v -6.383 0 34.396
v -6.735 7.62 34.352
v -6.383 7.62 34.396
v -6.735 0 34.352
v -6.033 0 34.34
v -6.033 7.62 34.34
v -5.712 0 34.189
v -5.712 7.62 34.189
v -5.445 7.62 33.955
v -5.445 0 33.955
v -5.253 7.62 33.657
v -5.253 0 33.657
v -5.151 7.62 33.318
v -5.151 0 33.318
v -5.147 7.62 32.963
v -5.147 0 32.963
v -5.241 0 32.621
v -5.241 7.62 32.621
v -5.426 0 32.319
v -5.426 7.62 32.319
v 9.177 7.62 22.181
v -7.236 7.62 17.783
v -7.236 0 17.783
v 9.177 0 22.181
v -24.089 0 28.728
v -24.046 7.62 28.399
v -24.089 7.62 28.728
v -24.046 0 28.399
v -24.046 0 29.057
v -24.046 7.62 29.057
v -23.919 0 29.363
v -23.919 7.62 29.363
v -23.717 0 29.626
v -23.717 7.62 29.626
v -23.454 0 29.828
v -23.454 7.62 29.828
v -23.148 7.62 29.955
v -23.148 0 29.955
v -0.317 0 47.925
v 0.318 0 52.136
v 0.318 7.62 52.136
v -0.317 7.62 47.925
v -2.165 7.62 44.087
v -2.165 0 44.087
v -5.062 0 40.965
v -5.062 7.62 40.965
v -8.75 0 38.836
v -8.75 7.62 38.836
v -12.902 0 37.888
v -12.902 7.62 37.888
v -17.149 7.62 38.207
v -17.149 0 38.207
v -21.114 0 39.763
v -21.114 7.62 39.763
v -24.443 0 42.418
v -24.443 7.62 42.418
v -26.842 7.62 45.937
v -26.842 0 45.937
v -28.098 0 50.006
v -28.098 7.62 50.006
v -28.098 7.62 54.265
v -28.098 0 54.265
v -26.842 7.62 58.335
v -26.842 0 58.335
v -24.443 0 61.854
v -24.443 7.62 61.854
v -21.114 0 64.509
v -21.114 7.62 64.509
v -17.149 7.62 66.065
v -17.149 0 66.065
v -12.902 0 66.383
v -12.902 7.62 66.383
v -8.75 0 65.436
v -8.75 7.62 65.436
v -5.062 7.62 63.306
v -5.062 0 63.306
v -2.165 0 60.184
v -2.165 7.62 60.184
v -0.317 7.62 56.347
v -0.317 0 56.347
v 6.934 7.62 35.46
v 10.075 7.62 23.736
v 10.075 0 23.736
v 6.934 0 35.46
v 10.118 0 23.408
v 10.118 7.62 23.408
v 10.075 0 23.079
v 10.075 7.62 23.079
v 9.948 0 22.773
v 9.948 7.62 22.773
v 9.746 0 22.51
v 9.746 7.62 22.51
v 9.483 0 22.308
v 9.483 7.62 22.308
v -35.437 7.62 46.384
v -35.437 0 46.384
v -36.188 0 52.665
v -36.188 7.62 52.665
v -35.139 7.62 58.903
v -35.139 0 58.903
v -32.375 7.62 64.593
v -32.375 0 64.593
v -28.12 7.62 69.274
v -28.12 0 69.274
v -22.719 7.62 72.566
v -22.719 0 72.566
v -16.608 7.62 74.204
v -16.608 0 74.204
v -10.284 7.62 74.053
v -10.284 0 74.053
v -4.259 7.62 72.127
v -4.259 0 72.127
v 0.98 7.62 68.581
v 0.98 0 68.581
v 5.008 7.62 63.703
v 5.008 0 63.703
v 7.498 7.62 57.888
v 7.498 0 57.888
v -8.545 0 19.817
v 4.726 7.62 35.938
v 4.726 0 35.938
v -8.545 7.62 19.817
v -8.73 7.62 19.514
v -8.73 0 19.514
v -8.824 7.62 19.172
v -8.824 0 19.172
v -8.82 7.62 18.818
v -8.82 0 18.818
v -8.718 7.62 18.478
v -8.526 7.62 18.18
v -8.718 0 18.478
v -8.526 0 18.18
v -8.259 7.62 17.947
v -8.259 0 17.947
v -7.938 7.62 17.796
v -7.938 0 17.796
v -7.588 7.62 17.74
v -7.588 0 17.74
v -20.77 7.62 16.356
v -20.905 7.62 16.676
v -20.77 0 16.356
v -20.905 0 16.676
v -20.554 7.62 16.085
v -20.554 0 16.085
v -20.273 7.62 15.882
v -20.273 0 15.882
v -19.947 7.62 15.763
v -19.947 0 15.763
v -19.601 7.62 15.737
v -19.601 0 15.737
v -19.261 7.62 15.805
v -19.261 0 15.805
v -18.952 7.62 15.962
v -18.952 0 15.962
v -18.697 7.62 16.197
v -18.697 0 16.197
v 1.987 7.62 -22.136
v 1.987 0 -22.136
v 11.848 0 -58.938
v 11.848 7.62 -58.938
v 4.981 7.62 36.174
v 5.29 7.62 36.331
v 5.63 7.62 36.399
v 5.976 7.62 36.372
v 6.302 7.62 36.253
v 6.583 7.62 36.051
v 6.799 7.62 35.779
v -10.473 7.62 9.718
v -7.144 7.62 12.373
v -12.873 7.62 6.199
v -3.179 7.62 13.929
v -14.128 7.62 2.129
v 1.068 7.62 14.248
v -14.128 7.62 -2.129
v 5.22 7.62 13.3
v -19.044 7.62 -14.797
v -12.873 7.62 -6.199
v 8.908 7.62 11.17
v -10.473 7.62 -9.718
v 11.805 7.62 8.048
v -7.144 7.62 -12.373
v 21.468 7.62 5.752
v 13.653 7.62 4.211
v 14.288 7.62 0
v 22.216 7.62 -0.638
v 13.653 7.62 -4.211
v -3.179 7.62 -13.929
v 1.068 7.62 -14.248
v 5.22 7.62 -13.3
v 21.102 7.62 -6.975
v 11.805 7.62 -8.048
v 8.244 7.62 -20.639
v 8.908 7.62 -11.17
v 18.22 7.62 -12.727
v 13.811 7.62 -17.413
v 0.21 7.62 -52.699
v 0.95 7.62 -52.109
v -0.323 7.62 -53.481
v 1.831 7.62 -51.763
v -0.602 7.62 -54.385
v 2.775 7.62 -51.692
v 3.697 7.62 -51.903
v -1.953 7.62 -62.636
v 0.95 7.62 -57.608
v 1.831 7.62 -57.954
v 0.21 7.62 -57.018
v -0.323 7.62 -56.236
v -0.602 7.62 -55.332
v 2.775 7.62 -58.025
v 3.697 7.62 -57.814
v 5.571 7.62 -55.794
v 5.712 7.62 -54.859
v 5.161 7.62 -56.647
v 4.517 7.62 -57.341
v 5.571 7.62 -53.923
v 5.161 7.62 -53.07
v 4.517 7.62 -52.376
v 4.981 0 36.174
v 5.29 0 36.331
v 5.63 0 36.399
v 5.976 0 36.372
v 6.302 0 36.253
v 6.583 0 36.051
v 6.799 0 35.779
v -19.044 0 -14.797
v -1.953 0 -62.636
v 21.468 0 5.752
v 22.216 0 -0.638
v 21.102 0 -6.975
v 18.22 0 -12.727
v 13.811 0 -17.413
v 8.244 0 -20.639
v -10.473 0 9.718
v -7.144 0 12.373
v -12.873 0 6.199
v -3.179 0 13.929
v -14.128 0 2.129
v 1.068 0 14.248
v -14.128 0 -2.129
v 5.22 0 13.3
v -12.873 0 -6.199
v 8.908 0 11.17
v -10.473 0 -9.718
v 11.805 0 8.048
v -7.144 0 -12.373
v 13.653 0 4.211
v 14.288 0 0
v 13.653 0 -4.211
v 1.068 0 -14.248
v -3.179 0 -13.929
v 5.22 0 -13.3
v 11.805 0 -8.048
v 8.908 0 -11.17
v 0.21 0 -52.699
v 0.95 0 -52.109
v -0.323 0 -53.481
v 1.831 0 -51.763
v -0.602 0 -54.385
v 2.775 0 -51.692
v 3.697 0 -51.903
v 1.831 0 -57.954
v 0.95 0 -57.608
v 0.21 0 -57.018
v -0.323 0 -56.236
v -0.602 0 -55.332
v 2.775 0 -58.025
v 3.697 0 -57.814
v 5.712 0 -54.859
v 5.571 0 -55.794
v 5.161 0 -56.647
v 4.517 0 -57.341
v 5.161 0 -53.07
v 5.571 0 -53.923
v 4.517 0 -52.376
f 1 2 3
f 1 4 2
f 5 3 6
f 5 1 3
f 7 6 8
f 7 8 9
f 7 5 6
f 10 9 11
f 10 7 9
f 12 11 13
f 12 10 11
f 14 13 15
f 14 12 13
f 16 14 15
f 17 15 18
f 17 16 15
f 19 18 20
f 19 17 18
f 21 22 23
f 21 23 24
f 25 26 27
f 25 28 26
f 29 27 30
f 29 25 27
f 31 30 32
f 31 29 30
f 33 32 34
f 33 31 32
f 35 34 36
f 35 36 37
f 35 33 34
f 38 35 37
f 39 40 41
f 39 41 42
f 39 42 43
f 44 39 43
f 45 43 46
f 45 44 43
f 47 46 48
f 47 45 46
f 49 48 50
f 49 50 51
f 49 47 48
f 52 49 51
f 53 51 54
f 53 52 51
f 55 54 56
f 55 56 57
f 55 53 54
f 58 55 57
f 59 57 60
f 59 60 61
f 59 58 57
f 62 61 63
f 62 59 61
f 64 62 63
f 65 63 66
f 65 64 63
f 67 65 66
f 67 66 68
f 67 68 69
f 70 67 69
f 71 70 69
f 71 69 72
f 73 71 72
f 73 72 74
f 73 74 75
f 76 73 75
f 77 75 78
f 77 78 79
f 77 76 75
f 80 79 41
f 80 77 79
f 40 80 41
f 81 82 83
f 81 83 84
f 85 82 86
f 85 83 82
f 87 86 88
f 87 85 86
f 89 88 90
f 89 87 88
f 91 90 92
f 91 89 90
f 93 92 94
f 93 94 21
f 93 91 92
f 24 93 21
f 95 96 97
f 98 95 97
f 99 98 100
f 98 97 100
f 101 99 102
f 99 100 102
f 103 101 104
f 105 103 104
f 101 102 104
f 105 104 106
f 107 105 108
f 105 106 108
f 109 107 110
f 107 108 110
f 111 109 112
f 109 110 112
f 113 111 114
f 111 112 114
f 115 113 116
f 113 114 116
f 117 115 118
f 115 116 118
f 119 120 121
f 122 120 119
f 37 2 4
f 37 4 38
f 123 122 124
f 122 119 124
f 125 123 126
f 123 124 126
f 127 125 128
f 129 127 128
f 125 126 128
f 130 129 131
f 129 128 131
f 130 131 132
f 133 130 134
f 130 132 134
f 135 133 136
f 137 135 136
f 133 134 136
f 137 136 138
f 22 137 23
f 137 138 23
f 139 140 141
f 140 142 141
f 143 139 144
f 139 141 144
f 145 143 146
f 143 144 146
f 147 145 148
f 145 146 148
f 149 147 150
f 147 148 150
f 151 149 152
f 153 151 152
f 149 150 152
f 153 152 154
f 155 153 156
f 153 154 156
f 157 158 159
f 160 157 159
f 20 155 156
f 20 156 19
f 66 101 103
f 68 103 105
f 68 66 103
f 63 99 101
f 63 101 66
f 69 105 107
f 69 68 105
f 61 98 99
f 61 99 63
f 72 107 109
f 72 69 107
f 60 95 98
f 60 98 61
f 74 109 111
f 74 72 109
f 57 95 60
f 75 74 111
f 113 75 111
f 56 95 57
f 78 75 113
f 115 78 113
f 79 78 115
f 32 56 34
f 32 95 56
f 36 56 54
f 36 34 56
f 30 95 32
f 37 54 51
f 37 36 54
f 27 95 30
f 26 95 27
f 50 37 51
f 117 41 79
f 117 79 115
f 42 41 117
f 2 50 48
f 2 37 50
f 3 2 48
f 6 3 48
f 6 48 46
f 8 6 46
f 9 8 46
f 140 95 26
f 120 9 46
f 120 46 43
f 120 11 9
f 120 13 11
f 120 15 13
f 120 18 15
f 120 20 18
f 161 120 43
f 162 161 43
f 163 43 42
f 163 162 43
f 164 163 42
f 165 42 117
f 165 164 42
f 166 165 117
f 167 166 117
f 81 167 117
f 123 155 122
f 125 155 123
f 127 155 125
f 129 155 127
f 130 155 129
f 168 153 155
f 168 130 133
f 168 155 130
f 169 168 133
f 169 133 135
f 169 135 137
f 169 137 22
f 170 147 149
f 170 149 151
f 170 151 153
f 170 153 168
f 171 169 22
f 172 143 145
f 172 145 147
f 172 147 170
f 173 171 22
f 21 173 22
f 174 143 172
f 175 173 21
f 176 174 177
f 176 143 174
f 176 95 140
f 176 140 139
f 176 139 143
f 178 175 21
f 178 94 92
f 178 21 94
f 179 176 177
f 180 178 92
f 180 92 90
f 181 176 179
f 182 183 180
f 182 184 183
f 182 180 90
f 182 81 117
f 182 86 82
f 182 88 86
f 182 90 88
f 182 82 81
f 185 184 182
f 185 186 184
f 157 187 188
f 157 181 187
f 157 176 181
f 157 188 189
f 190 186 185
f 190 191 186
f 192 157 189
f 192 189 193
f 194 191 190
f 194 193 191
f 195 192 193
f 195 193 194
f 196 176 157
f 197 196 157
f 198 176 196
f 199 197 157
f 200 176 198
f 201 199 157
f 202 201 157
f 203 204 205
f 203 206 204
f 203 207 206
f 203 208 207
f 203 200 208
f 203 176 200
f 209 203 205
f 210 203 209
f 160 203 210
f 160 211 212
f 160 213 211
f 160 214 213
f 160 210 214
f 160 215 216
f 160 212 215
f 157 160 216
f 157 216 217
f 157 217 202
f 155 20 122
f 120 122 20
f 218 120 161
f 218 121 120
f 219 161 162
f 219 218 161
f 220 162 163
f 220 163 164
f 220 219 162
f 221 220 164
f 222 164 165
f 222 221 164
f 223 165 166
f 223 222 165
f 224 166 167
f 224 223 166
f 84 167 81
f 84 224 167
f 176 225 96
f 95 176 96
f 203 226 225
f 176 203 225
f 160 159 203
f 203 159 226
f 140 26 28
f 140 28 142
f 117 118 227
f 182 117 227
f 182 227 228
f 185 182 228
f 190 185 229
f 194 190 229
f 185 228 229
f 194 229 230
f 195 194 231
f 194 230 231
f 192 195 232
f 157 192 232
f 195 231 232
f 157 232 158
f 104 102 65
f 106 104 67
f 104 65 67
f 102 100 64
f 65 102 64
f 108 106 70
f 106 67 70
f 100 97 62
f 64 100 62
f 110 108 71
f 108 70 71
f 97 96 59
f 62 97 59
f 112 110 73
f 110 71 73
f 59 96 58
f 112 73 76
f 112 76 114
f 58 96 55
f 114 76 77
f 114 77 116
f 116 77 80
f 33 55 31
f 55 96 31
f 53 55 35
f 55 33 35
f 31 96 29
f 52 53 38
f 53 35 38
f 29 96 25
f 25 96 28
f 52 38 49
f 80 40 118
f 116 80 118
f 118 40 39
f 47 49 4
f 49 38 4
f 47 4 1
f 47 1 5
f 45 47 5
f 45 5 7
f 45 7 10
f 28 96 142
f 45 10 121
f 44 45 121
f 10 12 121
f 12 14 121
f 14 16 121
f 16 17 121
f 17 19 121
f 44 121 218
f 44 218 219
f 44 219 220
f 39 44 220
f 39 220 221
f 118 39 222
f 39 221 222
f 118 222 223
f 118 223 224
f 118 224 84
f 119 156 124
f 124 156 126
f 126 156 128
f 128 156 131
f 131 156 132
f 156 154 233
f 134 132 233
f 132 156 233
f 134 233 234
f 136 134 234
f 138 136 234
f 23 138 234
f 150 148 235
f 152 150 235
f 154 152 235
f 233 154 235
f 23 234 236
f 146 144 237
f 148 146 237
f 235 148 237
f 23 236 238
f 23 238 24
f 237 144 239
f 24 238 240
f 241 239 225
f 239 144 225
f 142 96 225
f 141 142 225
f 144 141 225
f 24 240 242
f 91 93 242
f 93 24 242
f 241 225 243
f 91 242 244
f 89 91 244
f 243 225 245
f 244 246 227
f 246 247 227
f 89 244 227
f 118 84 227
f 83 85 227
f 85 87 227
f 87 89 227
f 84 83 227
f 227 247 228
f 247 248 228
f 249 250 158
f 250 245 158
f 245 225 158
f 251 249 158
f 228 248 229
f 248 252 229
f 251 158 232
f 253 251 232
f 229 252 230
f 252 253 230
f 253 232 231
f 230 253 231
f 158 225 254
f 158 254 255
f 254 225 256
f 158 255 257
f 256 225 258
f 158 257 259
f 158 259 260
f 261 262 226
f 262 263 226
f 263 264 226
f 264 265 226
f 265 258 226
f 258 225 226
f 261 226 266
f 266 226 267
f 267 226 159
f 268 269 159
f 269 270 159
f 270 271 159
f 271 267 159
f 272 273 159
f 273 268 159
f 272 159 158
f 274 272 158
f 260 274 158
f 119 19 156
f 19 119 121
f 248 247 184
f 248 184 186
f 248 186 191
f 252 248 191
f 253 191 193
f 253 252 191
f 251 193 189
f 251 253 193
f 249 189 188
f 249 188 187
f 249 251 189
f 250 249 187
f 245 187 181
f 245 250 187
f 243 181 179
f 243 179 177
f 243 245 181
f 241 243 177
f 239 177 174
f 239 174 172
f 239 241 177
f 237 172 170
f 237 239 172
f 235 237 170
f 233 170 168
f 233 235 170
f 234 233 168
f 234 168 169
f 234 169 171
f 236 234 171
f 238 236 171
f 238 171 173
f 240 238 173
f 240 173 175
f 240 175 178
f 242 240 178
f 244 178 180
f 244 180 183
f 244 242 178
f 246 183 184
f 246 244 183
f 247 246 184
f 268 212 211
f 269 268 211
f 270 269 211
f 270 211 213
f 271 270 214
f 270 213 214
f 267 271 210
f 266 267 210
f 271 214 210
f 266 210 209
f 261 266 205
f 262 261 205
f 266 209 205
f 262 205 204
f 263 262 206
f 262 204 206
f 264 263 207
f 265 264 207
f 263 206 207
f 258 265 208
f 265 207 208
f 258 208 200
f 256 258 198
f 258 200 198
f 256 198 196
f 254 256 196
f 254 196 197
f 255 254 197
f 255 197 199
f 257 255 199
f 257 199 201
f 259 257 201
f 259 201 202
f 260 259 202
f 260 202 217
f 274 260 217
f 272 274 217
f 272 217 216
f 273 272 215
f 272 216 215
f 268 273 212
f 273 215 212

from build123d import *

# Parameters (mm, degrees)
SKETCH1_R           = 14.2875
BOSS_EXTRUDE1_DEPTH = 7.62
CUT_EXTRUDE1_DEPTH  = 8.62
FILLET1_R           = 1.27
SKETCH3_R           = 3.175
CUT_EXTRUDE2_DEPTH  = 7.62


with BuildPart() as part:
    # Sketch1 → Boss-Extrude1 (new body)
    with BuildSketch(Plane(origin=(0, 0, 0), x_dir=(1, 0, 0), z_dir=(0, 1, 0))):
        with BuildLine():
            Line((7.49794353, -57.888099751), (21.467701489, -5.752253277))
            ThreePointArc((21.467701489, -5.752253277), (18.22000551, 12.727215887), (1.986922694, 22.136006036))
            Line((1.986922694, 22.136006036), (11.847928312, 58.937780017))
            Line((11.847928312, 58.937780017), (-1.952736931, 62.635657124))
            Line((-1.952736931, 62.635657124), (-19.044132712, 14.797135091))
            Line((-19.044132712, 14.797135091), (-35.437459449, -46.383593197))
            ThreePointArc((-35.437459449, -46.383593197), (-19.722011237, -73.603547963), (7.49794353, -57.888099751))
        make_face()
        with Locations((-13.969757959, -52.135846474)):
            Circle(SKETCH1_R, mode=Mode.SUBTRACT)
        Circle(SKETCH1_R, mode=Mode.SUBTRACT)
    extrude(amount=BOSS_EXTRUDE1_DEPTH)

    # Sketch2 → Cut-Extrude1 (cut, through all)
    with BuildSketch(Plane(origin=(0, 7.62, 0), x_dir=(1, 0, 0), z_dir=(0, 1, 0))):
        Polygon((-20.265778136, -14.291812351), (-2.906828988, -35.378138121), (-24.374530477, -29.625884844), align=None)
        Polygon((-11.064131806, -16.757386054), (10.403569683, -22.509639332), (6.294817342, -37.843711824), align=None)
    extrude(amount=-CUT_EXTRUDE1_DEPTH, mode=Mode.SUBTRACT)

    # Fillet1
    fillet1_edges = [part.edges().sort_by_distance(p)[0] for p in [
        (-24.374530477, 3.81, 29.625884844),
        (-20.265778136, 3.81, 14.291812351),
        (-2.906828988, 3.81, 35.378138121),
        (6.294817342, 3.81, 37.843711824),
        (-11.064131806, 3.81, 16.757386054),
        (10.403569683, 3.81, 22.509639332),
    ]]
    fillet(fillet1_edges, radius=FILLET1_R)

    # Sketch3 → Cut-Extrude2 (cut)
    with BuildSketch(Plane(origin=(0, 7.62, 0), x_dir=(1, 0, 0), z_dir=(0, 1, 0))):
        with Locations((2.537391129, 54.858527191)):
            Circle(SKETCH3_R)
    extrude(amount=-CUT_EXTRUDE2_DEPTH, mode=Mode.SUBTRACT)


solid = part.part
